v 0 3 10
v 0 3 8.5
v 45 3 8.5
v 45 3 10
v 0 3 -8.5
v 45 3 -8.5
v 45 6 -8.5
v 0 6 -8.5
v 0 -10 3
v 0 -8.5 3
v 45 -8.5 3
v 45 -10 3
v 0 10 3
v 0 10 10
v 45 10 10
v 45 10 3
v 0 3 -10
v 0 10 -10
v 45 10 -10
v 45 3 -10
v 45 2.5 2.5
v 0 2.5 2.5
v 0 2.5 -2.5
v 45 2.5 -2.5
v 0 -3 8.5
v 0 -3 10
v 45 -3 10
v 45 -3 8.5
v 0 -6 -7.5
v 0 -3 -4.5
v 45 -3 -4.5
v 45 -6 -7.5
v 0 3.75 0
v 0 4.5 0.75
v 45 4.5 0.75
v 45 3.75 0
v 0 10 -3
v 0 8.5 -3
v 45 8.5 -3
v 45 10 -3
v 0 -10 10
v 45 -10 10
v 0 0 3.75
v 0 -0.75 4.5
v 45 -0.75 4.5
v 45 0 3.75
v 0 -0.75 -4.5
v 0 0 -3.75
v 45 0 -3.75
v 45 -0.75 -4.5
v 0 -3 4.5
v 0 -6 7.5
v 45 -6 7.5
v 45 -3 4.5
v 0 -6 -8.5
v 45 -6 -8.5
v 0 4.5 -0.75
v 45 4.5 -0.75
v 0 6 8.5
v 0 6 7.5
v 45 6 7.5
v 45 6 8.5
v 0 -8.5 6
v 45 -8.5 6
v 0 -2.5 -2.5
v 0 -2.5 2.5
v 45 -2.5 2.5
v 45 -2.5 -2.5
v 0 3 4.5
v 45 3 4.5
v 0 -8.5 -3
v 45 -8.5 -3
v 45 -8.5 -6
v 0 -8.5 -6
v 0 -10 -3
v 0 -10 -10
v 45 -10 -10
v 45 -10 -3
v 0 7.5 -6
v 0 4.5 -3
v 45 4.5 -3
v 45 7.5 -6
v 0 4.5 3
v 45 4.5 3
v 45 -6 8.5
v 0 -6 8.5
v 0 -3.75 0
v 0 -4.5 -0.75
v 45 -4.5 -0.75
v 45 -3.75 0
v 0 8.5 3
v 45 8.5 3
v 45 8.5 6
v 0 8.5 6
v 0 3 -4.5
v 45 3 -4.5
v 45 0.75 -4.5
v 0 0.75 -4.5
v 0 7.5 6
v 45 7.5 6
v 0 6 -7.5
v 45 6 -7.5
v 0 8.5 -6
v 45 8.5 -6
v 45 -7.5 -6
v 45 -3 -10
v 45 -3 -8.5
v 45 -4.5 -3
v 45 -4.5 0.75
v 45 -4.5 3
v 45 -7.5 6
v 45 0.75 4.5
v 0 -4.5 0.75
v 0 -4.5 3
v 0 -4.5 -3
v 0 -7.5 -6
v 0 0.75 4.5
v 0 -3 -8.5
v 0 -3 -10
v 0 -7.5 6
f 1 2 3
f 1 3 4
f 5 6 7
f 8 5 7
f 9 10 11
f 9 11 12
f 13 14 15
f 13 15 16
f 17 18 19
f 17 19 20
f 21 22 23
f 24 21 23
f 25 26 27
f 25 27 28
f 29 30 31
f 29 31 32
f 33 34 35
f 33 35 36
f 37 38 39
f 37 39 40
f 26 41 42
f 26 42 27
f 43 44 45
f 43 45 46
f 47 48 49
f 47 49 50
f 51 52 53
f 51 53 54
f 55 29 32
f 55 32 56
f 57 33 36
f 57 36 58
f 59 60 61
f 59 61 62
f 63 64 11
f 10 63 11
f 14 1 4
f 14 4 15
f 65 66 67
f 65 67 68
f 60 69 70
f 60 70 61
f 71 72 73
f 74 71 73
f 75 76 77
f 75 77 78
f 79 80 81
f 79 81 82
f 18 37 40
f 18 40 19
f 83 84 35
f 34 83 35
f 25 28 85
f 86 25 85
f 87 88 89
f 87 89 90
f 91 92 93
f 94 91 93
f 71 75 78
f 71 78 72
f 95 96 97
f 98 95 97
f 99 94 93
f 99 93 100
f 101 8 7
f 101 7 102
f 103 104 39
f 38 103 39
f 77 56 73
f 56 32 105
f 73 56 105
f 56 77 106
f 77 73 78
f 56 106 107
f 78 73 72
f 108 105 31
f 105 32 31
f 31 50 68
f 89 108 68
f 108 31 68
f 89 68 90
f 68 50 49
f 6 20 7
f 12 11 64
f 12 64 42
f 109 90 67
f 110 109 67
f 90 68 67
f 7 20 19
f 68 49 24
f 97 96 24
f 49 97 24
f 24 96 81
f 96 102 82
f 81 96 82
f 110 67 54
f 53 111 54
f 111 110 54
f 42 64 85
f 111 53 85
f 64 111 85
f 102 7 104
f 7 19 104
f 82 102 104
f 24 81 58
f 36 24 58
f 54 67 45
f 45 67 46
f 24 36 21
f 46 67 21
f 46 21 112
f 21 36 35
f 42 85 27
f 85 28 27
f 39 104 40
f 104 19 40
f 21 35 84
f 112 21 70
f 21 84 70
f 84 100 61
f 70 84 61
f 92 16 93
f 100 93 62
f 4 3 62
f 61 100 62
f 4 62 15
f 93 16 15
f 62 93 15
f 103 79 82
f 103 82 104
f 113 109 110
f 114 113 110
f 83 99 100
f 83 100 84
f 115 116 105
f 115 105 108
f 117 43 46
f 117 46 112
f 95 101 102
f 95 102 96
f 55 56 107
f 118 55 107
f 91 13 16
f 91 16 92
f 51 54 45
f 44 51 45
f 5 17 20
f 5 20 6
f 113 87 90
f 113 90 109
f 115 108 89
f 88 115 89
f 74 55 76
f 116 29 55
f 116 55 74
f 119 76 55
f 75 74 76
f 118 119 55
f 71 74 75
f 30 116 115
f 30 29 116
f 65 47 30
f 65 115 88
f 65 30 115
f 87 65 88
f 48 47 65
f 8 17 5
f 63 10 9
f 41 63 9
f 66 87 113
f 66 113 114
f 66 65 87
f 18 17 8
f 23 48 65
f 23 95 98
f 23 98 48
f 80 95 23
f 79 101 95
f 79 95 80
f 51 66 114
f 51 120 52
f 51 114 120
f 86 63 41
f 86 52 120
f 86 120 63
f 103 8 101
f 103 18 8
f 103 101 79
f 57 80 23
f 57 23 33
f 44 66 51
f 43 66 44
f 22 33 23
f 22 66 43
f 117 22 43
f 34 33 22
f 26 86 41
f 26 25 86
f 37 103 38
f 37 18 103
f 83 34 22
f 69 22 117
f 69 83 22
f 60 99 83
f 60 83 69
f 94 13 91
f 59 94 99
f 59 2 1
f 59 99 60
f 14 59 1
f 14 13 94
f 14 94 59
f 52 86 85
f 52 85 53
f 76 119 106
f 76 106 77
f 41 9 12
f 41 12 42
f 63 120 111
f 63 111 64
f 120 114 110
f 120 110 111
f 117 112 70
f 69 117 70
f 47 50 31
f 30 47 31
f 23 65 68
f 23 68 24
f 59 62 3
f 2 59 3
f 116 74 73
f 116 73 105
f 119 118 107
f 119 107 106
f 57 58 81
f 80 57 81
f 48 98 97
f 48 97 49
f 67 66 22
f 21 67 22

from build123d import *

# Parameters (mm, degrees)
SKETCH1_W           = 5
SKETCH1_H           = 5
BOSS_EXTRUDE2_DEPTH = 45


with BuildPart() as part:
    # Sketch1 → Boss-Extrude2 (new body)
    with BuildSketch(Plane(origin=(0, 0, 0), x_dir=(0, 0, -1), z_dir=(1, 0, 0))):
        Polygon((-10, 10), (-3, 10), (-3, 8.5), (-6, 8.5), (-6, 7.5), (-3, 4.5), (-0.75, 4.5), (0, 3.75), (0.75, 4.5), (3, 4.5), (6, 7.5), (6, 8.5), (3, 8.5), (3, 10), (10, 10), (10, 3), (8.5, 3), (8.5, 6), (7.5, 6), (4.5, 3), (4.5, 0.75), (3.75, 0), (4.5, -0.75), (4.5, -3), (7.5, -6), (8.5, -6), (8.5, -3), (10, -3), (10, -10), (3, -10), (3, -8.5), (6, -8.5), (6, -7.5), (3, -4.5), (0.75, -4.5), (0, -3.75), (-0.75, -4.5), (-3, -4.5), (-6, -7.5), (-6, -8.5), (-3, -8.5), (-3, -10), (-10, -10), (-10, -3), (-8.5, -3), (-8.5, -6), (-7.5, -6), (-4.5, -3), (-4.5, -0.75), (-3.75, 0), (-4.5, 0.75), (-4.5, 3), (-7.5, 6), (-8.5, 6), (-8.5, 3), (-10, 3), align=None)
        Rectangle(SKETCH1_W, SKETCH1_H, mode=Mode.SUBTRACT)
    extrude(amount=BOSS_EXTRUDE2_DEPTH)


solid = part.part
